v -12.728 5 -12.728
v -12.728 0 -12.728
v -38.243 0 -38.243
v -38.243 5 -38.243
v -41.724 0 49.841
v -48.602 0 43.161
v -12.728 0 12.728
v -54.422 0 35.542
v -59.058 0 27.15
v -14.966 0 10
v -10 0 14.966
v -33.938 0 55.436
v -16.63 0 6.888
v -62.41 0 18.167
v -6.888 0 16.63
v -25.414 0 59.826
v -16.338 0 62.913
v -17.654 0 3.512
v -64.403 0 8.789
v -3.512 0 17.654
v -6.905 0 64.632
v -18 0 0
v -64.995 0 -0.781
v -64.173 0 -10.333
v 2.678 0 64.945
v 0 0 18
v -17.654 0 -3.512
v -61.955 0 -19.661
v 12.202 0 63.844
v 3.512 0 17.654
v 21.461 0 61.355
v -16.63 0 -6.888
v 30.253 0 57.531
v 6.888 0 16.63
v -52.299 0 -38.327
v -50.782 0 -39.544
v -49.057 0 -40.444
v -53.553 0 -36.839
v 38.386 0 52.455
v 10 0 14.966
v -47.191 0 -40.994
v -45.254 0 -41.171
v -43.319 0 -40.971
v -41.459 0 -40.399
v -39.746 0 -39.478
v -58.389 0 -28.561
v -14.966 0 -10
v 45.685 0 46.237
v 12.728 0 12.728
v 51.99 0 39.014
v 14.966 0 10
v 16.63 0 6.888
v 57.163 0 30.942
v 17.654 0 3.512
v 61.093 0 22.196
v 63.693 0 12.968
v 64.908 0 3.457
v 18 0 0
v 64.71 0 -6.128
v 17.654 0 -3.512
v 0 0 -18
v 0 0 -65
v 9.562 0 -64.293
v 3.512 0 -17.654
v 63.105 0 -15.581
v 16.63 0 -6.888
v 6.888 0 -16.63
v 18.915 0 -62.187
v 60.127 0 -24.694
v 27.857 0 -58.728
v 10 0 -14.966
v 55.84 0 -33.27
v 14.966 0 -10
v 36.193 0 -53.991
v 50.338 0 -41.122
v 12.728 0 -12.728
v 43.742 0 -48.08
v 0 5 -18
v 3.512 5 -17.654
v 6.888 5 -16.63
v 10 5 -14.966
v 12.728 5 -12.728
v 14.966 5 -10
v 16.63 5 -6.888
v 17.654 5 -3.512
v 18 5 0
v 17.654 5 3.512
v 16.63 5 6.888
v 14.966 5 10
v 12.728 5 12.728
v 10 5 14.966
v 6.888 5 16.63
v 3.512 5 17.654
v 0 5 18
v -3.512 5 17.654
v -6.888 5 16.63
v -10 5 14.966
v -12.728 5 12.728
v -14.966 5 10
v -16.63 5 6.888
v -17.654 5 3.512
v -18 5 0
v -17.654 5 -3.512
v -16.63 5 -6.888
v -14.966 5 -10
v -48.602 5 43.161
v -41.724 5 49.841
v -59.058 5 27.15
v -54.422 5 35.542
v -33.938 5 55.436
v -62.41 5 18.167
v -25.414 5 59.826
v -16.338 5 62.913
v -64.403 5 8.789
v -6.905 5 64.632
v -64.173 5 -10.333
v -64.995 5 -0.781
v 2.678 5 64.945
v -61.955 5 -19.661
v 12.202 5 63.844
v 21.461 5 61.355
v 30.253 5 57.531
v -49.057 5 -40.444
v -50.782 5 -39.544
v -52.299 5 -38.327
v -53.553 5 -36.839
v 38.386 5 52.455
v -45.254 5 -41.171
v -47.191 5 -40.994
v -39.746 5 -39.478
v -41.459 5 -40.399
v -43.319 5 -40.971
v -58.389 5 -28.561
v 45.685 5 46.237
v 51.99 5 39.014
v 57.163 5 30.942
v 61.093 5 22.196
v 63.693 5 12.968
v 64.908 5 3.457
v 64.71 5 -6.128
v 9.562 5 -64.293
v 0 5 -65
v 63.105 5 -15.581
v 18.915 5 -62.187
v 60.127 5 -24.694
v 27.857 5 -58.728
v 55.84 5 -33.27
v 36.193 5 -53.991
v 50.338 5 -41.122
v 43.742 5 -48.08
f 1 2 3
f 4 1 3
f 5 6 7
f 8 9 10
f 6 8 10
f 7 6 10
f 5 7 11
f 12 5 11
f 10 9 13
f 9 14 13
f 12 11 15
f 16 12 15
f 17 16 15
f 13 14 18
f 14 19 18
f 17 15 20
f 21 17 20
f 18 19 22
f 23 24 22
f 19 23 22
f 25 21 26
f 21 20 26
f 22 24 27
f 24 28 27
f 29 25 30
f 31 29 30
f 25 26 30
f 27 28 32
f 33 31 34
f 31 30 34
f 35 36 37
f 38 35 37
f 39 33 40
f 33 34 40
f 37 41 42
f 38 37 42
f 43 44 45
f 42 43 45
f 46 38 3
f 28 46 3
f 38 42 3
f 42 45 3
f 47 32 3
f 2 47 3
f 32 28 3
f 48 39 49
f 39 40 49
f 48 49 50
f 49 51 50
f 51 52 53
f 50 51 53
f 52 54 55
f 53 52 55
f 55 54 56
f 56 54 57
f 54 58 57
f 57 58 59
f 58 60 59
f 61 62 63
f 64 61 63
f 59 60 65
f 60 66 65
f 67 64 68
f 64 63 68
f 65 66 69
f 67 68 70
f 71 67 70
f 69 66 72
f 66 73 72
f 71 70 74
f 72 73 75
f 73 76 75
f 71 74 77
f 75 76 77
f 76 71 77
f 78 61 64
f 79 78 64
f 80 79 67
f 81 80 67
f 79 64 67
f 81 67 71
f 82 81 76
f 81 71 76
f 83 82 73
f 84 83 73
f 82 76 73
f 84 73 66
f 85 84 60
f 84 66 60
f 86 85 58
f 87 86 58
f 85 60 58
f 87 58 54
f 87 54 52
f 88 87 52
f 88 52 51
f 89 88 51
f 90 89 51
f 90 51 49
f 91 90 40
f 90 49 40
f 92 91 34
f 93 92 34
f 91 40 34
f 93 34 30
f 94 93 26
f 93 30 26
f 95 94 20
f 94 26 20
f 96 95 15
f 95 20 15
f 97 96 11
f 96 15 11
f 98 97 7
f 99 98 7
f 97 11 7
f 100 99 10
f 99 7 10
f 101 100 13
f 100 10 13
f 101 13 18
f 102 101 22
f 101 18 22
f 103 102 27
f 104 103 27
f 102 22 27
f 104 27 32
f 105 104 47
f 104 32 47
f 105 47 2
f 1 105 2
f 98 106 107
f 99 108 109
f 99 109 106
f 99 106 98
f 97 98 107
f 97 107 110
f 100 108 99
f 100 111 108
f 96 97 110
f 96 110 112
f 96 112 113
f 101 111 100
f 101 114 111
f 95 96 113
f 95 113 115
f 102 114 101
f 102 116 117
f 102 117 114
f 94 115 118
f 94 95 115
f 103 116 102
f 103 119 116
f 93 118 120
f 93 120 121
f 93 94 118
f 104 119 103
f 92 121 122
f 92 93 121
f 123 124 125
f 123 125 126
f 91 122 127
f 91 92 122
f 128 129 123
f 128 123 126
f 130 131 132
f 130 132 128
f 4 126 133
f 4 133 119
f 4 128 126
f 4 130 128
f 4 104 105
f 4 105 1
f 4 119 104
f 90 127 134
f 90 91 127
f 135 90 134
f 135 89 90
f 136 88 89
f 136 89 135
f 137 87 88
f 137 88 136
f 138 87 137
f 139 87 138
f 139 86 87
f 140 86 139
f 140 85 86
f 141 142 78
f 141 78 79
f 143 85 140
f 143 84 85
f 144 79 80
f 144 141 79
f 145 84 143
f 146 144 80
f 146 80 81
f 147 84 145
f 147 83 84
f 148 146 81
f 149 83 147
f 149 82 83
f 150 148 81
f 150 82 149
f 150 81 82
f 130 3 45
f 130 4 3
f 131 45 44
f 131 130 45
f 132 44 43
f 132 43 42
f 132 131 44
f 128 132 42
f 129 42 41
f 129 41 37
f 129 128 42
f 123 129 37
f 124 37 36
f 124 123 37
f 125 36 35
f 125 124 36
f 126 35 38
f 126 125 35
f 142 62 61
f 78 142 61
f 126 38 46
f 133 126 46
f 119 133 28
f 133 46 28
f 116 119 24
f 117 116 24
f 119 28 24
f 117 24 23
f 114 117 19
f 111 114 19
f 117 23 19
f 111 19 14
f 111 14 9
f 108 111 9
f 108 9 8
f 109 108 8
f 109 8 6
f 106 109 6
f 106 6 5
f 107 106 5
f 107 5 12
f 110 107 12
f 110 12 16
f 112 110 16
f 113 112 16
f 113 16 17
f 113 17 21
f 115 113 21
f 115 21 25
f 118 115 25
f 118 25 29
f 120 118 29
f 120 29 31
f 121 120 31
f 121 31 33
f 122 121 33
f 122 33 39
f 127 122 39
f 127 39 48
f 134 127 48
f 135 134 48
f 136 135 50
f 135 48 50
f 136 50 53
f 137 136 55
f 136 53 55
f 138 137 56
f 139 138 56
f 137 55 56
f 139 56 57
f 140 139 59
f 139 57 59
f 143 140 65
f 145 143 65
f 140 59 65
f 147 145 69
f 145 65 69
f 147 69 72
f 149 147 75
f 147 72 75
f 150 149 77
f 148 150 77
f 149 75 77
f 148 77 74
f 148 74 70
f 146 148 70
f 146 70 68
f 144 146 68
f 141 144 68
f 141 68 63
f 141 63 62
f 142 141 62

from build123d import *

# Parameters (mm, degrees)
EXTRUDE_1_DEPTH = 5
FILLET_1_R      = 10


with BuildPart() as part:
    # Эскиз1 → Бобышка-Вытянуть1 (new body)
    with BuildSketch(Plane(origin=(0, 0, 0), x_dir=(1, 0, 0), z_dir=(0, 1, 0))):
        with BuildLine():
            Line((-12.727922061, 12.727922061), (-45.961940777, 45.961940777))
            ThreePointArc((-45.961940777, 45.961940777), (24.874423104, -60.052169613), (0, 65))
            Line((0, 65), (0, 18))
            ThreePointArc((0, 18), (6.888301783, -16.629831585), (-12.727922061, 12.727922061))
        make_face()
    extrude(amount=EXTRUDE_1_DEPTH)

    # Скругление1
    fillet_1_edges = [part.edges().sort_by_distance(p)[0] for p in [
        (-45.961940777, 2.5, -45.961940777),
    ]]
    fillet(fillet_1_edges, radius=FILLET_1_R)


solid = part.part
